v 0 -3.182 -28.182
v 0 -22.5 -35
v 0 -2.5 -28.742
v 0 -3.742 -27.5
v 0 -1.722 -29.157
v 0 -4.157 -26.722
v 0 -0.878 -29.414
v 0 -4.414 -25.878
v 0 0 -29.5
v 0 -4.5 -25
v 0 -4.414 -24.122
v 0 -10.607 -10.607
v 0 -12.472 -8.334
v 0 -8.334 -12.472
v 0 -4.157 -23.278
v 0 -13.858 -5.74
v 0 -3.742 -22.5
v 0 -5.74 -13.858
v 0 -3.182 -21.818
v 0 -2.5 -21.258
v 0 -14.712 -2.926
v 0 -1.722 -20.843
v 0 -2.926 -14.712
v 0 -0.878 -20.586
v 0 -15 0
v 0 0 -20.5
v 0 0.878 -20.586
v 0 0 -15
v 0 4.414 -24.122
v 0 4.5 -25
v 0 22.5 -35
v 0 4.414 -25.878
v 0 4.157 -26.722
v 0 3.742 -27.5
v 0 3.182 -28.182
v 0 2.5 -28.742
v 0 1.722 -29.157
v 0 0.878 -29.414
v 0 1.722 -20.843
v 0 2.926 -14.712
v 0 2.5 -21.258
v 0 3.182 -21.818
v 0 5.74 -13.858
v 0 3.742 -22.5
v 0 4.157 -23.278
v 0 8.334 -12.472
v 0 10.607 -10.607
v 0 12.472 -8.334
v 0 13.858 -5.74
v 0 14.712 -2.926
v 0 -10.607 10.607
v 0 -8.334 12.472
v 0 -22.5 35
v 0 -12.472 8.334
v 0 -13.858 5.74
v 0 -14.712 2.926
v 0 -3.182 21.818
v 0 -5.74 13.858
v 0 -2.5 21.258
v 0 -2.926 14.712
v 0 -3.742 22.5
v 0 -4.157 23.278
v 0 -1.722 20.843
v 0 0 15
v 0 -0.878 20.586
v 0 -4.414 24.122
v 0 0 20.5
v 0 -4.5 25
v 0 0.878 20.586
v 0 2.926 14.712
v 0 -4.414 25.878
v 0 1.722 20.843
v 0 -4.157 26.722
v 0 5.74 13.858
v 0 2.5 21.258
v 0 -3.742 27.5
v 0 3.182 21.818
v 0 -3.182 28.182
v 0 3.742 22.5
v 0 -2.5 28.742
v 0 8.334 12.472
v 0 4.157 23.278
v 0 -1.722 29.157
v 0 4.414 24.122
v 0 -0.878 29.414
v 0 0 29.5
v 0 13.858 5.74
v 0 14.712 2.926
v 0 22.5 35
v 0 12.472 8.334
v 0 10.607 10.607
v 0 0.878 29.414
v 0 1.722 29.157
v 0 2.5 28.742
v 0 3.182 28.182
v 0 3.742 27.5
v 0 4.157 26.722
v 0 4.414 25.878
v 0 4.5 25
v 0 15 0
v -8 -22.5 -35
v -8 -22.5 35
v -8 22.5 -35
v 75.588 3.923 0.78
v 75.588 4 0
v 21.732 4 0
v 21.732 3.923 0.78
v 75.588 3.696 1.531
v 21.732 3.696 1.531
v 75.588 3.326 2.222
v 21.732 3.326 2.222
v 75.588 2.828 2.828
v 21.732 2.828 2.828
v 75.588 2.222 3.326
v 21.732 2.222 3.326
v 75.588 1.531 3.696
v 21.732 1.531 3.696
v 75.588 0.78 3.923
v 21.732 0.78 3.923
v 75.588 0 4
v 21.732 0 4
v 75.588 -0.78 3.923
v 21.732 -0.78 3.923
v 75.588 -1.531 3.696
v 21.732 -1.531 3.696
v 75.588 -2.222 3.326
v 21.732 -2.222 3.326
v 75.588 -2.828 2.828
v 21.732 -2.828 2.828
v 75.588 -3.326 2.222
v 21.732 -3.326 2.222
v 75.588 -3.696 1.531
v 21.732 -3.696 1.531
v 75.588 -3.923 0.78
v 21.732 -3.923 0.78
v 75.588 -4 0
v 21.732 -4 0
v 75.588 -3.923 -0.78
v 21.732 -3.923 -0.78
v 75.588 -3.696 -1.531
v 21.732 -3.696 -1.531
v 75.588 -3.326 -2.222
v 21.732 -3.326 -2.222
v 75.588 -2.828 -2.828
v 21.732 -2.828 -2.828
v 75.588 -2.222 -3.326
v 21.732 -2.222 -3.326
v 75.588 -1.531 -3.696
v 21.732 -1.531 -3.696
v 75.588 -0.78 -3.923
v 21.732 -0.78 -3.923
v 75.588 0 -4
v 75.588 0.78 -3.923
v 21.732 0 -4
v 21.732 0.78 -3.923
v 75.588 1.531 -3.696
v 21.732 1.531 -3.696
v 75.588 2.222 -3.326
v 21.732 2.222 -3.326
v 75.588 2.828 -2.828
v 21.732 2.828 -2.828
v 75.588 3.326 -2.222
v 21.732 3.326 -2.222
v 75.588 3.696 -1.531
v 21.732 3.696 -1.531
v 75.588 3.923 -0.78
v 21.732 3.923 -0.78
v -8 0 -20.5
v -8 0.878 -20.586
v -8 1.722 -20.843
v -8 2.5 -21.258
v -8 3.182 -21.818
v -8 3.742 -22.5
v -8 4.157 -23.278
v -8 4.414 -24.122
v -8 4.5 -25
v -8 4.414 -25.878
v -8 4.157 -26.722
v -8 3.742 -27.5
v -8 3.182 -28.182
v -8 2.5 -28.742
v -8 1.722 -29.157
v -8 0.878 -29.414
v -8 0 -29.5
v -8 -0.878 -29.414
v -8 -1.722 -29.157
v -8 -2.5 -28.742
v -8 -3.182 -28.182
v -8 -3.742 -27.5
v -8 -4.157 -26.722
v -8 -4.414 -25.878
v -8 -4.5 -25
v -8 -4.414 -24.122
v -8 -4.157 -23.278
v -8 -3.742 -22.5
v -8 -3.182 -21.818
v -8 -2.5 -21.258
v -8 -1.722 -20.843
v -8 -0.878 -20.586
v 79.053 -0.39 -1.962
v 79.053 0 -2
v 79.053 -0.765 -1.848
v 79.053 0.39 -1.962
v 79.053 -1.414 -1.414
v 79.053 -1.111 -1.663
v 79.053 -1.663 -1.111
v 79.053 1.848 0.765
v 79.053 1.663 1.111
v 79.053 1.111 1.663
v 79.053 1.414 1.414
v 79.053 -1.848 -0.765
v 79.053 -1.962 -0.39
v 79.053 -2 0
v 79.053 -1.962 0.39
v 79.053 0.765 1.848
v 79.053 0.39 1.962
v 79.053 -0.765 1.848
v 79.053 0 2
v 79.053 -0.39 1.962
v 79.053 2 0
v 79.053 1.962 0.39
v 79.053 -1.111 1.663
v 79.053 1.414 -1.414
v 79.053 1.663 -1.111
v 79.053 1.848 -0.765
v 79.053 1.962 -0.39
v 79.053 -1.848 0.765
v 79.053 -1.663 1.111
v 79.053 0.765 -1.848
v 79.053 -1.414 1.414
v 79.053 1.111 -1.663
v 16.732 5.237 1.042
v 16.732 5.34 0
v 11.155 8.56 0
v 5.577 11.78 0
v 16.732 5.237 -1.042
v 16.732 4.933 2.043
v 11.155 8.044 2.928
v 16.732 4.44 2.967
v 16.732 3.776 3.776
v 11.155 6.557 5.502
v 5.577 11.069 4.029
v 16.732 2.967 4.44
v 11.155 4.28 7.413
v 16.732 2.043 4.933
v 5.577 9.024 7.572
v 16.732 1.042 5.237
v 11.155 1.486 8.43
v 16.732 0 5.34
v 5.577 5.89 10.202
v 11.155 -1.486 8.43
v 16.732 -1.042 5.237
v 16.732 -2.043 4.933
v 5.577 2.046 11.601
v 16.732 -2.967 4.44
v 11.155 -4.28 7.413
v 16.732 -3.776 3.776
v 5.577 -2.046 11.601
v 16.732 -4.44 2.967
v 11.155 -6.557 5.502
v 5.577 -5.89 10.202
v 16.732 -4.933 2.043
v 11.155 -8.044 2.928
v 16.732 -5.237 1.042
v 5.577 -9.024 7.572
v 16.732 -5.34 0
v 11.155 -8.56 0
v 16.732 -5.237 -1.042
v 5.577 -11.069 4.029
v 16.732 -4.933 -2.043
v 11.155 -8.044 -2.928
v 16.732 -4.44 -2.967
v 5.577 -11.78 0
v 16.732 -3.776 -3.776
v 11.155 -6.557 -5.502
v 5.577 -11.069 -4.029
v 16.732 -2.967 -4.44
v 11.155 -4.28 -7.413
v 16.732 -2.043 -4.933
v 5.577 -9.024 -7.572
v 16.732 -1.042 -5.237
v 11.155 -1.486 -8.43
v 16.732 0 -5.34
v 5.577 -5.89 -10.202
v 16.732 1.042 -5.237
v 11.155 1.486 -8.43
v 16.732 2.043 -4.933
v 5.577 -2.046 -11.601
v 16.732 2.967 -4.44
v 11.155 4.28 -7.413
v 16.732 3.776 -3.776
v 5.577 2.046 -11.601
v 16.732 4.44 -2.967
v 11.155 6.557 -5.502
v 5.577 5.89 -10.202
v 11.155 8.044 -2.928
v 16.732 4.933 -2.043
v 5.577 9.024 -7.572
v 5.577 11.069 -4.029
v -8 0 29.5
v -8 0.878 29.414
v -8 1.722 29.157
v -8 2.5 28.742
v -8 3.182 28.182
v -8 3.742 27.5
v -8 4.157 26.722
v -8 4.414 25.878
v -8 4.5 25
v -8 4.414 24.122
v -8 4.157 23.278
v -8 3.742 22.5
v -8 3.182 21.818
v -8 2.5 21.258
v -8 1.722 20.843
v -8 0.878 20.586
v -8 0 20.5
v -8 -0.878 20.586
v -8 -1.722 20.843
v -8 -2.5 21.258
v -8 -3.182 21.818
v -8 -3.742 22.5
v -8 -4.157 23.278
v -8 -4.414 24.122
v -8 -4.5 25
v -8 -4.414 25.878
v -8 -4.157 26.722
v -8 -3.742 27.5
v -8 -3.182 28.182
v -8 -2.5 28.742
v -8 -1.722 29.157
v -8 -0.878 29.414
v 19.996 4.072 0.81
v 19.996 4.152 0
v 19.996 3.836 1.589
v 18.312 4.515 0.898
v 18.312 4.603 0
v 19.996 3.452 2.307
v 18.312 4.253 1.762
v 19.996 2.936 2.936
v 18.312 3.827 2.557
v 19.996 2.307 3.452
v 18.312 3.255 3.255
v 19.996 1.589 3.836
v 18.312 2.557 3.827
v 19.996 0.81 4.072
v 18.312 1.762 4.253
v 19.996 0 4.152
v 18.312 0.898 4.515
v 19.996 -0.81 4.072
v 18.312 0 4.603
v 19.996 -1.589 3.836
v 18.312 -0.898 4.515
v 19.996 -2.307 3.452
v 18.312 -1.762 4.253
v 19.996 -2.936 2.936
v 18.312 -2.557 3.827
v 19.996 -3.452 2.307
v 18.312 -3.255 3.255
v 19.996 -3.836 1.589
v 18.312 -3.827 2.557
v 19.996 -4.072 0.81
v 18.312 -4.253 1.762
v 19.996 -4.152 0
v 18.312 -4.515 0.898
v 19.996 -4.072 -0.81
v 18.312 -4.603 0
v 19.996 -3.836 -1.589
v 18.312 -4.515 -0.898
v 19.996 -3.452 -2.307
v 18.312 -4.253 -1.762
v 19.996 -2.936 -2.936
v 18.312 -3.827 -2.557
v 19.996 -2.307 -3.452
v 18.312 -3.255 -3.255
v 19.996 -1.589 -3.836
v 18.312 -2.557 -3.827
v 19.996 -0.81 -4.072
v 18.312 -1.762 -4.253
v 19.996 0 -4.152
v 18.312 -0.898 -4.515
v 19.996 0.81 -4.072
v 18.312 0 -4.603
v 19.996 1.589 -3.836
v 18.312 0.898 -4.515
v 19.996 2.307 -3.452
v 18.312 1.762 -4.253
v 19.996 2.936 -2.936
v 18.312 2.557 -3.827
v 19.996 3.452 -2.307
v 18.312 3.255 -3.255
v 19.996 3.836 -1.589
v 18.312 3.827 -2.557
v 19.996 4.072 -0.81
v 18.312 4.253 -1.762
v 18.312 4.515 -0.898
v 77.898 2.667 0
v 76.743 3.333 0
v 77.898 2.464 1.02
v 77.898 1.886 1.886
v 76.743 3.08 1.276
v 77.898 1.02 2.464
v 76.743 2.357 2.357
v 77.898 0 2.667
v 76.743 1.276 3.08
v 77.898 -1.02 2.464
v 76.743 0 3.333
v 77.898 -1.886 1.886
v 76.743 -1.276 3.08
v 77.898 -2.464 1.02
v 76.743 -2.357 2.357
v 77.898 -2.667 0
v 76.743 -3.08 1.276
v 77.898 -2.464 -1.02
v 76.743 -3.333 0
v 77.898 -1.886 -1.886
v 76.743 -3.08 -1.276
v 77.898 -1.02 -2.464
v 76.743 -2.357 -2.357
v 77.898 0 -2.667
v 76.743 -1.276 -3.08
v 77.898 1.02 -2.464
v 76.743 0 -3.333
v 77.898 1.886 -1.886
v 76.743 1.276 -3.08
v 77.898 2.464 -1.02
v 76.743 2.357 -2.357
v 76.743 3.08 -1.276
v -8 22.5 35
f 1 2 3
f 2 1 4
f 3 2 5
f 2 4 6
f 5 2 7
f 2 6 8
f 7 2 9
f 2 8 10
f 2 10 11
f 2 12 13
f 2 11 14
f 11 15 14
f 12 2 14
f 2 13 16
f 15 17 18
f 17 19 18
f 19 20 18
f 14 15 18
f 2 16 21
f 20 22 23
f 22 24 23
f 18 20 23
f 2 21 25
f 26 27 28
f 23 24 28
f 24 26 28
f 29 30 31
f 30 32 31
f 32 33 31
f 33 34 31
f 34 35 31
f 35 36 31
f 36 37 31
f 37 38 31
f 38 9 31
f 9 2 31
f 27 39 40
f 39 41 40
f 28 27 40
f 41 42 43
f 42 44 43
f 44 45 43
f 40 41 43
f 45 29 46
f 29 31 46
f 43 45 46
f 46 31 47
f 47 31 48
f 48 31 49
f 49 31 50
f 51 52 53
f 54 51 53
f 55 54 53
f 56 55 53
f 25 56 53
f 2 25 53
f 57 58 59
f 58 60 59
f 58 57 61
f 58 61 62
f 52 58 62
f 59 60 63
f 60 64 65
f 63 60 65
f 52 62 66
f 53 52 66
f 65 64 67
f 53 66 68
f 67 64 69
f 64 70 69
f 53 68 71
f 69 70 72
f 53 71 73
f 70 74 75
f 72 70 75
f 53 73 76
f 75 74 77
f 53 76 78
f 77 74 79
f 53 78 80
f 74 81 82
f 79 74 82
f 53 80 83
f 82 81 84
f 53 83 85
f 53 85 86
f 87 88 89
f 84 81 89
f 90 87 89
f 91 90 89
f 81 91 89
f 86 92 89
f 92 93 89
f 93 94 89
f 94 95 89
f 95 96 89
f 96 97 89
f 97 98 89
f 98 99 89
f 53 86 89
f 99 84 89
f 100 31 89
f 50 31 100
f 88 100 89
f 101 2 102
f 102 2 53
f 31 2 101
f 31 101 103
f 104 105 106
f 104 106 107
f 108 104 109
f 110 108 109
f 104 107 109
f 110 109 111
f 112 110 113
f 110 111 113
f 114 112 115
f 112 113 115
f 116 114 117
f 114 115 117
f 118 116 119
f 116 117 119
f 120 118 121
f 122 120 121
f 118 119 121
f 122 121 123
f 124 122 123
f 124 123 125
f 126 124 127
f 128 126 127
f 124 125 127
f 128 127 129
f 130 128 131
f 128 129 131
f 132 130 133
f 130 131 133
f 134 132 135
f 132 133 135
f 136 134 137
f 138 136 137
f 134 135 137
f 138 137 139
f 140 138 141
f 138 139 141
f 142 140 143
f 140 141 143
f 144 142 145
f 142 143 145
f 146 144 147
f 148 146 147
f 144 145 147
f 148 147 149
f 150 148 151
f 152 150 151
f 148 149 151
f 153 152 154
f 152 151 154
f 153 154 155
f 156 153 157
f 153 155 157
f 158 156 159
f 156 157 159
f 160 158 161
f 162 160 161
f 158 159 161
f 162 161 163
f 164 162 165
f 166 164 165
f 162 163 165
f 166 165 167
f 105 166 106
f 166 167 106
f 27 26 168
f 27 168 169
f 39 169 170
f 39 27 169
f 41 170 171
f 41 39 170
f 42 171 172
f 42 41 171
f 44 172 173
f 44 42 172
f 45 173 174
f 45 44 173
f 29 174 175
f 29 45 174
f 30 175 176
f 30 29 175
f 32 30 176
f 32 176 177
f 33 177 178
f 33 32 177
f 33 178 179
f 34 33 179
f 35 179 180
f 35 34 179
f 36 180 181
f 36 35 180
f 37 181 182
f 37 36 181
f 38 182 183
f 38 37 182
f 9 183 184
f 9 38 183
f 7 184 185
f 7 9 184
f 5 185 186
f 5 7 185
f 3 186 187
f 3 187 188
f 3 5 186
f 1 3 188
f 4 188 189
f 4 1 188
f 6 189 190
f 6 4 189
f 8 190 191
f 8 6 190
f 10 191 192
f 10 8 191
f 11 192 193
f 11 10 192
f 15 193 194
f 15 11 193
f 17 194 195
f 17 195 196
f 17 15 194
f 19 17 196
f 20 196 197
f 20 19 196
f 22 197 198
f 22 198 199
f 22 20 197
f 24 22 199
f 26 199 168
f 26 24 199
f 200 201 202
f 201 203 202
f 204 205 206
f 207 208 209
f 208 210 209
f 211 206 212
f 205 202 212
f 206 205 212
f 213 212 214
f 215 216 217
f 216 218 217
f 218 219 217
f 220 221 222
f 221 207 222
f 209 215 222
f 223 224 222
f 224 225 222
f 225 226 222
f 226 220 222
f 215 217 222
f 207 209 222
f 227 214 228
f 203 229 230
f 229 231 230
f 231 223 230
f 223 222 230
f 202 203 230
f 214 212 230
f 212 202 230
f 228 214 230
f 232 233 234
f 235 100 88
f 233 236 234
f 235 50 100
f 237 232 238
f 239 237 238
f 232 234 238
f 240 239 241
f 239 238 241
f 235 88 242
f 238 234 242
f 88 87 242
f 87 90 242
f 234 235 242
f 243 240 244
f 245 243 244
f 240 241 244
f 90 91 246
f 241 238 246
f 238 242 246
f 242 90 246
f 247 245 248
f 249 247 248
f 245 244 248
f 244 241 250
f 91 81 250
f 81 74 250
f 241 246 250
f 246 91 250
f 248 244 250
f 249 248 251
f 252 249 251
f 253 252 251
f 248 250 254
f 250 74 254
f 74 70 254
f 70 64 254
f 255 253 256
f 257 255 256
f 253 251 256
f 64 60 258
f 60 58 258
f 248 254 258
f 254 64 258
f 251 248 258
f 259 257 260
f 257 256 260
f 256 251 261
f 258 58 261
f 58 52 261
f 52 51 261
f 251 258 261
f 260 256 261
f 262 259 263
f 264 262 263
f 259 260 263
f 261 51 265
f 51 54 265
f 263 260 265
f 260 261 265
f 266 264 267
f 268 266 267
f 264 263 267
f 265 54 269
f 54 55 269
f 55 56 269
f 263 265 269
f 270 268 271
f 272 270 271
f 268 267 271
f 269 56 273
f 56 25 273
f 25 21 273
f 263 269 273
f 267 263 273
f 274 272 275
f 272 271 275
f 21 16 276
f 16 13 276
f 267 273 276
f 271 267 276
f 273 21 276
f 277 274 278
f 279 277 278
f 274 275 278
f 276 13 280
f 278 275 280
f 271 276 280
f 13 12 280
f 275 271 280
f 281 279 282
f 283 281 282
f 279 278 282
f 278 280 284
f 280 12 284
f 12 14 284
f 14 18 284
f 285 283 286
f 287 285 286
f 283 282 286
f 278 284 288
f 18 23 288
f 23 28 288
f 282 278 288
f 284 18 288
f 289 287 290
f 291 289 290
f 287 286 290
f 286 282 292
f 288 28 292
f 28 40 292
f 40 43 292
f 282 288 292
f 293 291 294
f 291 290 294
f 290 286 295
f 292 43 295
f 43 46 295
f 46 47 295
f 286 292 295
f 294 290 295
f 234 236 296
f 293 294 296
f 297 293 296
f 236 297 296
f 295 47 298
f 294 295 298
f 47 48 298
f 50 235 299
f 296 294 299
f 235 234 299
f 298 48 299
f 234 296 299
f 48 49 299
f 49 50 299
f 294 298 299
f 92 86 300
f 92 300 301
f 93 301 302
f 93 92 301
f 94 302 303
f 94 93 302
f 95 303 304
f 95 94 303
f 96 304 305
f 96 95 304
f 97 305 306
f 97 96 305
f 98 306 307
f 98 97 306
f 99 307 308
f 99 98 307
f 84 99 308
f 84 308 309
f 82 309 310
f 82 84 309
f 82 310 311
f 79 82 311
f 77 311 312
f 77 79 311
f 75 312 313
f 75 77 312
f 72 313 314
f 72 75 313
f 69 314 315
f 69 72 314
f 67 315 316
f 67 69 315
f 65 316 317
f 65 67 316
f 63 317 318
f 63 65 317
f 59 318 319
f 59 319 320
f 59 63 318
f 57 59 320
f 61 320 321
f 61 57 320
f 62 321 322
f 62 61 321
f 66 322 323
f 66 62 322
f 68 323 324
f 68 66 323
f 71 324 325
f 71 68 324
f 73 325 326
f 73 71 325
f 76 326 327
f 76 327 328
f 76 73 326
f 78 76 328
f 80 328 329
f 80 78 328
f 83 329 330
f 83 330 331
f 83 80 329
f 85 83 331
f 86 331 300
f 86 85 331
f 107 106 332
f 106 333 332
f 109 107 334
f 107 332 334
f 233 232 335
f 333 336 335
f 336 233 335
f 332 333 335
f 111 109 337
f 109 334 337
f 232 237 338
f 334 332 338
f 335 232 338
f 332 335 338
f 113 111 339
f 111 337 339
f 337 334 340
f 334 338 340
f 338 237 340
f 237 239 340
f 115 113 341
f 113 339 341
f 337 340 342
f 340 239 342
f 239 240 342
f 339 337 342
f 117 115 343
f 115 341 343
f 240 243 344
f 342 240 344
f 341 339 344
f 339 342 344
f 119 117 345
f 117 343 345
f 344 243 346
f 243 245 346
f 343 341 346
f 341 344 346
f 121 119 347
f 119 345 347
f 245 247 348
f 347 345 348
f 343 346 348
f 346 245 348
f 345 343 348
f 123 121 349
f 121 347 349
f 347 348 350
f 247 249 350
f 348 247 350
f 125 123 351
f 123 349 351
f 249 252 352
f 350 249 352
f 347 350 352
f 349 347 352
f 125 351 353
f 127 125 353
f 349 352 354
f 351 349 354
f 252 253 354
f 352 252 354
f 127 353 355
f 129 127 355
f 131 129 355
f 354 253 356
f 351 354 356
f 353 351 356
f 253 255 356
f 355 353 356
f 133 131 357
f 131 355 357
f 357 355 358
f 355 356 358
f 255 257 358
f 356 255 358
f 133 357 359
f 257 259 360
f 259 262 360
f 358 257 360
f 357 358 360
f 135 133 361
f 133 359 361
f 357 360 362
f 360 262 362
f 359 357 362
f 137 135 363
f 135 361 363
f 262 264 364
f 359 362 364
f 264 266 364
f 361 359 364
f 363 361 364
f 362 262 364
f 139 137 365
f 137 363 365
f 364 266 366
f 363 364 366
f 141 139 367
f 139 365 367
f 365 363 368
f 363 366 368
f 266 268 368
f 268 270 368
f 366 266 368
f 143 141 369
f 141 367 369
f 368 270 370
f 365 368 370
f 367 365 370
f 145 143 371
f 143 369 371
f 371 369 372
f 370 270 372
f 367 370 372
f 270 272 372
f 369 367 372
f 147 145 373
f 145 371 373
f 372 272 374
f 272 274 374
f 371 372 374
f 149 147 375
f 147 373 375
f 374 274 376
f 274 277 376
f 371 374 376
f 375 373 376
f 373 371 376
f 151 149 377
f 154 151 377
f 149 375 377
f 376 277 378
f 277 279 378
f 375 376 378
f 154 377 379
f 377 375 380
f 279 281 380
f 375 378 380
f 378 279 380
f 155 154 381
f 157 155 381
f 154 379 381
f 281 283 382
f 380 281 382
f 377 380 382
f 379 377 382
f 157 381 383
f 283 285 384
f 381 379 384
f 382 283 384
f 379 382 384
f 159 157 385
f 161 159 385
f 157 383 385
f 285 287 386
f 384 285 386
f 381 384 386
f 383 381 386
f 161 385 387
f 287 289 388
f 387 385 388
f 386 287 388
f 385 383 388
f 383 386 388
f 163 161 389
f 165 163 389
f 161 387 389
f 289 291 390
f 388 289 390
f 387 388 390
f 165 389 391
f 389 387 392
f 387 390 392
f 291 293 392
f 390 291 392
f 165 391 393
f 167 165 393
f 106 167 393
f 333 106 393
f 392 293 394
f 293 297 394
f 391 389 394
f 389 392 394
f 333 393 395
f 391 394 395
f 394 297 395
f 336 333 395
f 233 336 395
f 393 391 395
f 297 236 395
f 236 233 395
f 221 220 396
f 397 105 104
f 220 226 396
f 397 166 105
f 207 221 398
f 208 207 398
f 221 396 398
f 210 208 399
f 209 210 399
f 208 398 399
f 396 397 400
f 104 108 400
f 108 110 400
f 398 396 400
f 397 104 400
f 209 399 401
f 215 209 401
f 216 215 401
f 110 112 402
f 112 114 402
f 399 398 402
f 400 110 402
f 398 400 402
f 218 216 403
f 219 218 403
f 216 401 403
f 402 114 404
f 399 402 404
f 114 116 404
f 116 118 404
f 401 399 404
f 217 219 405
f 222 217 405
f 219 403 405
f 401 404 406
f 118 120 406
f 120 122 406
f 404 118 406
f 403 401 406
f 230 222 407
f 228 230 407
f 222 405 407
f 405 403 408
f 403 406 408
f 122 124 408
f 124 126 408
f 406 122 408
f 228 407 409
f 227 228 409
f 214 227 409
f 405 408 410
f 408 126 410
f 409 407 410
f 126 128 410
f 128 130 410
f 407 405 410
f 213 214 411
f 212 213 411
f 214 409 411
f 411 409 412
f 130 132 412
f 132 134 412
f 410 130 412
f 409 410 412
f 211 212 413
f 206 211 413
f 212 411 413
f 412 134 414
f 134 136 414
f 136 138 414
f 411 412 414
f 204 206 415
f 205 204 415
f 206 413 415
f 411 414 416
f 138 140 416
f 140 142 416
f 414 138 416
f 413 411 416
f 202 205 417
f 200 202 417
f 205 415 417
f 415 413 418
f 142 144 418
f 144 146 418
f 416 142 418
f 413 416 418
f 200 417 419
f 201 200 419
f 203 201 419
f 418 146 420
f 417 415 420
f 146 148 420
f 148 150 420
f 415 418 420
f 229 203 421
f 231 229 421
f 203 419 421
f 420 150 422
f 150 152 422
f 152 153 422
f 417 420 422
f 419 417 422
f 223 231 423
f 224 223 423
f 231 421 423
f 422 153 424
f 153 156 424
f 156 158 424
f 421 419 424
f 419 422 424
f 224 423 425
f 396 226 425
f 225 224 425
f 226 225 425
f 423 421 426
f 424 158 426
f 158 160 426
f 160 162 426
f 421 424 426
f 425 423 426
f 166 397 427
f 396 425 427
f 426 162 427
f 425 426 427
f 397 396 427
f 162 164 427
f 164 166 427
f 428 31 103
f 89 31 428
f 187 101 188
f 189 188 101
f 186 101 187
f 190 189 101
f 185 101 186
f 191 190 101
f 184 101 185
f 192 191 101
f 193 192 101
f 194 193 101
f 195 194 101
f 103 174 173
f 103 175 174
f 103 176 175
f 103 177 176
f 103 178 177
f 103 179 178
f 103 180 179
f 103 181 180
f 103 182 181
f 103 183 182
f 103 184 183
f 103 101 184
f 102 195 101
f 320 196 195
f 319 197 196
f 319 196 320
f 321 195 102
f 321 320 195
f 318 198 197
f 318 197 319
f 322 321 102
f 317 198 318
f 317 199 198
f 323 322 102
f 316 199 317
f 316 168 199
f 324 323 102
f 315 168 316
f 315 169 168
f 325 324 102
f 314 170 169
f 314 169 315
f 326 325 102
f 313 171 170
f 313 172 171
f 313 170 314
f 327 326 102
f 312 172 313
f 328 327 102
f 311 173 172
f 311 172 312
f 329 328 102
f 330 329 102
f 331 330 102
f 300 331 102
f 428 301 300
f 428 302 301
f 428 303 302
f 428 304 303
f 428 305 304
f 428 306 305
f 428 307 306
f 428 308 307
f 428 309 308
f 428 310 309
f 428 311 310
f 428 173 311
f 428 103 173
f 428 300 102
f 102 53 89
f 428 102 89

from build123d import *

# Parameters (mm, degrees)
FASE1_SIZE                      = 2
FASE1_SIZE2                     = 3.464101615
SKIZZE2_W                       = 70
SKIZZE2_H                       = 45
SKIZZE2_R                       = 4.5
AUFSATZ_LINEAR_AUSTRAGEN1_DEPTH = 8


with BuildPart() as part:
    # Skizze1 → Rotation1 (revolve)
    with BuildSketch(Plane.XY):
        with BuildLine():
            Line((79.052558883, 0), (79.052558883, 4))
            Line((79.052558883, 4), (21.732050808, 4))
            ThreePointArc((21.732050808, 4), (19.143860357, 4.340741737), (16.732050808, 5.339745962))
            Line((16.732050808, 5.339745962), (0, 15))
            Line((0, 15), (0, 0))
            Line((0, 0), (79.052558883, 0))
        make_face()
    revolve(axis=Axis((0, 0, 0), (1, 0, 0)))

    # Fase1
    fase1_edges = [part.edges().sort_by_distance(p)[0] for p in [
        (79.052558883, -4, 0),
    ]]
    fase1_side = [part.faces().sort_by_distance(p)[0] for p in [
        (79.052558883, 0, 0),
    ]]
    chamfer(fase1_edges, length=FASE1_SIZE, length2=FASE1_SIZE2, reference=fase1_side[0])

    # Skizze2 → Aufsatz-Linear austragen1 (add)
    with BuildSketch(Plane.ZY):
        Rectangle(SKIZZE2_W, SKIZZE2_H)
        with Locations((-25, 0)):
            Circle(SKIZZE2_R, mode=Mode.SUBTRACT)
        with Locations((25, 0)):
            Circle(SKIZZE2_R, mode=Mode.SUBTRACT)
    extrude(amount=AUFSATZ_LINEAR_AUSTRAGEN1_DEPTH)


solid = part.part
